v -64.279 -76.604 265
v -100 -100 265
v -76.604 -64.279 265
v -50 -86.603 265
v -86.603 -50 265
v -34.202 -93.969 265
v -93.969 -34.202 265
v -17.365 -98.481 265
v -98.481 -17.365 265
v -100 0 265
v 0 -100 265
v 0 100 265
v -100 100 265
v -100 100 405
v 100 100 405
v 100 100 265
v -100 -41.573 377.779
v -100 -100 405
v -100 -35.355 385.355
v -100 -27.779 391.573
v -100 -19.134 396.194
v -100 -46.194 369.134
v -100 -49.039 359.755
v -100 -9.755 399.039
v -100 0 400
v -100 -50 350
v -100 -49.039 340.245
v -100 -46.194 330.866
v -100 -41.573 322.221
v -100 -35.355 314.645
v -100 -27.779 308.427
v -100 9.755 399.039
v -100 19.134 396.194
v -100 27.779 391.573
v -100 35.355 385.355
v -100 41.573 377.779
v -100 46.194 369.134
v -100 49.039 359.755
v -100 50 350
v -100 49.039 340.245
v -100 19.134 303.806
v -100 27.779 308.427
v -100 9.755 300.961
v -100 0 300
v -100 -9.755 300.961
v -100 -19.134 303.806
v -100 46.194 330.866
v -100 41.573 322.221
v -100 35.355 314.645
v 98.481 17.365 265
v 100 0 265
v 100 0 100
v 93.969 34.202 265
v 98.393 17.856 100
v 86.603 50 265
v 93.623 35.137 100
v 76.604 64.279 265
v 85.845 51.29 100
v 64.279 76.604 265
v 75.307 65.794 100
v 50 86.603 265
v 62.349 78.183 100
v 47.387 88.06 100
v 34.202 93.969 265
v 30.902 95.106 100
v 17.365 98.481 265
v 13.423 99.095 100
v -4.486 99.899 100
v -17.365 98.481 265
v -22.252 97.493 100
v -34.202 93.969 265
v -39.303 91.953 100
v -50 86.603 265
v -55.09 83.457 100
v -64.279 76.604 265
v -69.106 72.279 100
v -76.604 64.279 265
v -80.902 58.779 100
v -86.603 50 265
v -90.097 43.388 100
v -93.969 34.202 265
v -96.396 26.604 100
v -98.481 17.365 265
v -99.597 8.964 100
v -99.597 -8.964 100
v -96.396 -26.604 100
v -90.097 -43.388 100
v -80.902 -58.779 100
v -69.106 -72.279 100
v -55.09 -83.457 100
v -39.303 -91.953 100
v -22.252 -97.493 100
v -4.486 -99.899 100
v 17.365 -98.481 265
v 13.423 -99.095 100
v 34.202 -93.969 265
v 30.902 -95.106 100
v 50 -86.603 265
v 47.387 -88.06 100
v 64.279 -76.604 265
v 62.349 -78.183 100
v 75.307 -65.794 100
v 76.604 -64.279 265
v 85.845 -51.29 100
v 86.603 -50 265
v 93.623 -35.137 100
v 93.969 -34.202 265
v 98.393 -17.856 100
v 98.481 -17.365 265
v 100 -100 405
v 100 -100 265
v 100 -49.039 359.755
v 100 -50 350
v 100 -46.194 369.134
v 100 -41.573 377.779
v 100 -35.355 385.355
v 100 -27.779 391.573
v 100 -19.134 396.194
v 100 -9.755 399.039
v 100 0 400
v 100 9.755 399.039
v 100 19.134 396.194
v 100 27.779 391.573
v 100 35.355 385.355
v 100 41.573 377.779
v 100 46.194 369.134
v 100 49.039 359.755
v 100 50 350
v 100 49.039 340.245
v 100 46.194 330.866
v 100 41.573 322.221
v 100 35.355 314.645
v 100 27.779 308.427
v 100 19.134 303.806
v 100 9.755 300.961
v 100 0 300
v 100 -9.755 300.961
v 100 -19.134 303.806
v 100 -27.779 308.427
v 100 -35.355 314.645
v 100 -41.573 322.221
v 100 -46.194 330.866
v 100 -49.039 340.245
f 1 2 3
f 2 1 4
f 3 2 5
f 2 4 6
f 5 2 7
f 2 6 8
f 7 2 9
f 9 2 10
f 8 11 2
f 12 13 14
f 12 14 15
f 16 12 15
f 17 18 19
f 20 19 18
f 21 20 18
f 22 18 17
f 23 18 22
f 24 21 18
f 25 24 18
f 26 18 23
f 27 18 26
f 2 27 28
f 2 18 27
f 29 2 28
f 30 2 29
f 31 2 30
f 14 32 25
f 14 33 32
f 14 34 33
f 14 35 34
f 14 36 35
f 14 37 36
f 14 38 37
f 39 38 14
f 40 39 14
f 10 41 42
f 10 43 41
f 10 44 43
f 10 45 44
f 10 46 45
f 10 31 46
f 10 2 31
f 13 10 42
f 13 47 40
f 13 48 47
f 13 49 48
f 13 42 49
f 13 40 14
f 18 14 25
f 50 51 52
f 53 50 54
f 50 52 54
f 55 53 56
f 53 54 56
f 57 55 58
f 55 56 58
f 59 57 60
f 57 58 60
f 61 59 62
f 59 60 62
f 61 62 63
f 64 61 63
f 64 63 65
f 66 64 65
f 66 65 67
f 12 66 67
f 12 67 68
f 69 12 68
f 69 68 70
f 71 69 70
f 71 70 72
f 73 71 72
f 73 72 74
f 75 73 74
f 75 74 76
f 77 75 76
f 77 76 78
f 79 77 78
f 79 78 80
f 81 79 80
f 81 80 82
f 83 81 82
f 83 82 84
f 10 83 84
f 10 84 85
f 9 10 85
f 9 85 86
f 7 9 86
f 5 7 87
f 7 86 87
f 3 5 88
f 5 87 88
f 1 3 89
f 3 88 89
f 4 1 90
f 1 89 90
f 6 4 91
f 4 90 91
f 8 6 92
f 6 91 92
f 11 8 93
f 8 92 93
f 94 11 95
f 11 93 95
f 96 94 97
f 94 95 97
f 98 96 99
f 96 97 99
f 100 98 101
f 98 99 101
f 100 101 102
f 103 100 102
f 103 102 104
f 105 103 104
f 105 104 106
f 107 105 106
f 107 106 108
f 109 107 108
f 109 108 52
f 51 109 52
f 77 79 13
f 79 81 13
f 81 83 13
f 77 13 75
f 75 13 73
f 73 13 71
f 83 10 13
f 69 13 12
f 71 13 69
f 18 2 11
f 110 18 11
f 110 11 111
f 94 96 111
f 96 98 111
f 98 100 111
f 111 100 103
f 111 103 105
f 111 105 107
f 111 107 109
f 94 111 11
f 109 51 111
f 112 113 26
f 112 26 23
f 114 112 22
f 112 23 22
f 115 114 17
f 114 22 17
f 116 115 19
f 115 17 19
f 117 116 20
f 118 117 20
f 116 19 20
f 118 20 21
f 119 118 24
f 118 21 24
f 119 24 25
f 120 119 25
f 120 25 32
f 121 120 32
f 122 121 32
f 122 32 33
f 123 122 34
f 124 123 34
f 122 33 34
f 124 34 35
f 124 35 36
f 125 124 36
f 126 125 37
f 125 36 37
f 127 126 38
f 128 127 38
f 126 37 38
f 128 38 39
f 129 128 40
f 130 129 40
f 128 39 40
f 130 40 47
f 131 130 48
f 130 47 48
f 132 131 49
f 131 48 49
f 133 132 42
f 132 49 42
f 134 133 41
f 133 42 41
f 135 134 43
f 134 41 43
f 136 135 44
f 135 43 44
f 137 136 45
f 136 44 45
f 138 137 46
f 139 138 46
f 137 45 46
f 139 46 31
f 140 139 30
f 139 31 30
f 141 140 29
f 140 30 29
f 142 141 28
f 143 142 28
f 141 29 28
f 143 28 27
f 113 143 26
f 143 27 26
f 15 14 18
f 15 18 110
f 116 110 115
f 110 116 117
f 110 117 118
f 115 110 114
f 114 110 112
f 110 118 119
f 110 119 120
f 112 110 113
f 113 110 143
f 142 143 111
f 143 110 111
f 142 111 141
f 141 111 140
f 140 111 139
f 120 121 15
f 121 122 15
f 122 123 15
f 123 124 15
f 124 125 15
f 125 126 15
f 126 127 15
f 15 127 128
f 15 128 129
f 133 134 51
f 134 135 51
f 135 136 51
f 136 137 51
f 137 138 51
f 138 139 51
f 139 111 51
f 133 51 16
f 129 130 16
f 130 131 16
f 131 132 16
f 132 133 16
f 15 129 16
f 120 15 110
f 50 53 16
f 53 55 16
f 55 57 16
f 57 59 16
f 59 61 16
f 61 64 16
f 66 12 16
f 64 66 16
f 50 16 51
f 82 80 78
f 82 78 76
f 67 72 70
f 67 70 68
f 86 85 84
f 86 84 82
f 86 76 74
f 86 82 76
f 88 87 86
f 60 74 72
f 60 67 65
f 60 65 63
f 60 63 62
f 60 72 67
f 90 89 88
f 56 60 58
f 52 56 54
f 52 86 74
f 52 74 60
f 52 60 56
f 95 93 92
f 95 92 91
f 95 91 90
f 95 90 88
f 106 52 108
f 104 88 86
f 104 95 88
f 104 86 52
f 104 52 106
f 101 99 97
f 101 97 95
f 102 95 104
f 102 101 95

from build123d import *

# Parameters (mm, degrees)
F0_R     = 100
F1_DEPTH = 265
F2_R     = 100
F3_DEPTH = 100
F4_W     = 200
F4_H     = 200
F5_DEPTH = 140
F6_R     = 50
F7_DEPTH = 200


with BuildPart() as f1:
    # F0 (on Top) → F1 (new body)
    with BuildSketch(Plane.XY):
        Circle(F0_R)
    extrude(amount=F1_DEPTH)

    # F2 (on face) → F3 (cut)
    with BuildSketch(Plane(origin=(0, 0, 0), x_dir=(1, 0, 0), z_dir=(0, 0, -1))):
        Circle(F2_R)
    extrude(amount=-F3_DEPTH, mode=Mode.SUBTRACT)

    # F4 (on face) → F5 (join)
    with BuildSketch(Plane.XY.offset(265)):
        Rectangle(F4_W, F4_H)
    extrude(amount=F5_DEPTH)

    # F6 (on face) → F7 (cut)
    with BuildSketch(Plane(origin=(-100, 0, 0), x_dir=(0, -1, 0), z_dir=(-1, 0, 0))):
        with Locations((0, 350)):
            Circle(F6_R)
    extrude(amount=-F7_DEPTH, mode=Mode.SUBTRACT)


solid = f1.part
